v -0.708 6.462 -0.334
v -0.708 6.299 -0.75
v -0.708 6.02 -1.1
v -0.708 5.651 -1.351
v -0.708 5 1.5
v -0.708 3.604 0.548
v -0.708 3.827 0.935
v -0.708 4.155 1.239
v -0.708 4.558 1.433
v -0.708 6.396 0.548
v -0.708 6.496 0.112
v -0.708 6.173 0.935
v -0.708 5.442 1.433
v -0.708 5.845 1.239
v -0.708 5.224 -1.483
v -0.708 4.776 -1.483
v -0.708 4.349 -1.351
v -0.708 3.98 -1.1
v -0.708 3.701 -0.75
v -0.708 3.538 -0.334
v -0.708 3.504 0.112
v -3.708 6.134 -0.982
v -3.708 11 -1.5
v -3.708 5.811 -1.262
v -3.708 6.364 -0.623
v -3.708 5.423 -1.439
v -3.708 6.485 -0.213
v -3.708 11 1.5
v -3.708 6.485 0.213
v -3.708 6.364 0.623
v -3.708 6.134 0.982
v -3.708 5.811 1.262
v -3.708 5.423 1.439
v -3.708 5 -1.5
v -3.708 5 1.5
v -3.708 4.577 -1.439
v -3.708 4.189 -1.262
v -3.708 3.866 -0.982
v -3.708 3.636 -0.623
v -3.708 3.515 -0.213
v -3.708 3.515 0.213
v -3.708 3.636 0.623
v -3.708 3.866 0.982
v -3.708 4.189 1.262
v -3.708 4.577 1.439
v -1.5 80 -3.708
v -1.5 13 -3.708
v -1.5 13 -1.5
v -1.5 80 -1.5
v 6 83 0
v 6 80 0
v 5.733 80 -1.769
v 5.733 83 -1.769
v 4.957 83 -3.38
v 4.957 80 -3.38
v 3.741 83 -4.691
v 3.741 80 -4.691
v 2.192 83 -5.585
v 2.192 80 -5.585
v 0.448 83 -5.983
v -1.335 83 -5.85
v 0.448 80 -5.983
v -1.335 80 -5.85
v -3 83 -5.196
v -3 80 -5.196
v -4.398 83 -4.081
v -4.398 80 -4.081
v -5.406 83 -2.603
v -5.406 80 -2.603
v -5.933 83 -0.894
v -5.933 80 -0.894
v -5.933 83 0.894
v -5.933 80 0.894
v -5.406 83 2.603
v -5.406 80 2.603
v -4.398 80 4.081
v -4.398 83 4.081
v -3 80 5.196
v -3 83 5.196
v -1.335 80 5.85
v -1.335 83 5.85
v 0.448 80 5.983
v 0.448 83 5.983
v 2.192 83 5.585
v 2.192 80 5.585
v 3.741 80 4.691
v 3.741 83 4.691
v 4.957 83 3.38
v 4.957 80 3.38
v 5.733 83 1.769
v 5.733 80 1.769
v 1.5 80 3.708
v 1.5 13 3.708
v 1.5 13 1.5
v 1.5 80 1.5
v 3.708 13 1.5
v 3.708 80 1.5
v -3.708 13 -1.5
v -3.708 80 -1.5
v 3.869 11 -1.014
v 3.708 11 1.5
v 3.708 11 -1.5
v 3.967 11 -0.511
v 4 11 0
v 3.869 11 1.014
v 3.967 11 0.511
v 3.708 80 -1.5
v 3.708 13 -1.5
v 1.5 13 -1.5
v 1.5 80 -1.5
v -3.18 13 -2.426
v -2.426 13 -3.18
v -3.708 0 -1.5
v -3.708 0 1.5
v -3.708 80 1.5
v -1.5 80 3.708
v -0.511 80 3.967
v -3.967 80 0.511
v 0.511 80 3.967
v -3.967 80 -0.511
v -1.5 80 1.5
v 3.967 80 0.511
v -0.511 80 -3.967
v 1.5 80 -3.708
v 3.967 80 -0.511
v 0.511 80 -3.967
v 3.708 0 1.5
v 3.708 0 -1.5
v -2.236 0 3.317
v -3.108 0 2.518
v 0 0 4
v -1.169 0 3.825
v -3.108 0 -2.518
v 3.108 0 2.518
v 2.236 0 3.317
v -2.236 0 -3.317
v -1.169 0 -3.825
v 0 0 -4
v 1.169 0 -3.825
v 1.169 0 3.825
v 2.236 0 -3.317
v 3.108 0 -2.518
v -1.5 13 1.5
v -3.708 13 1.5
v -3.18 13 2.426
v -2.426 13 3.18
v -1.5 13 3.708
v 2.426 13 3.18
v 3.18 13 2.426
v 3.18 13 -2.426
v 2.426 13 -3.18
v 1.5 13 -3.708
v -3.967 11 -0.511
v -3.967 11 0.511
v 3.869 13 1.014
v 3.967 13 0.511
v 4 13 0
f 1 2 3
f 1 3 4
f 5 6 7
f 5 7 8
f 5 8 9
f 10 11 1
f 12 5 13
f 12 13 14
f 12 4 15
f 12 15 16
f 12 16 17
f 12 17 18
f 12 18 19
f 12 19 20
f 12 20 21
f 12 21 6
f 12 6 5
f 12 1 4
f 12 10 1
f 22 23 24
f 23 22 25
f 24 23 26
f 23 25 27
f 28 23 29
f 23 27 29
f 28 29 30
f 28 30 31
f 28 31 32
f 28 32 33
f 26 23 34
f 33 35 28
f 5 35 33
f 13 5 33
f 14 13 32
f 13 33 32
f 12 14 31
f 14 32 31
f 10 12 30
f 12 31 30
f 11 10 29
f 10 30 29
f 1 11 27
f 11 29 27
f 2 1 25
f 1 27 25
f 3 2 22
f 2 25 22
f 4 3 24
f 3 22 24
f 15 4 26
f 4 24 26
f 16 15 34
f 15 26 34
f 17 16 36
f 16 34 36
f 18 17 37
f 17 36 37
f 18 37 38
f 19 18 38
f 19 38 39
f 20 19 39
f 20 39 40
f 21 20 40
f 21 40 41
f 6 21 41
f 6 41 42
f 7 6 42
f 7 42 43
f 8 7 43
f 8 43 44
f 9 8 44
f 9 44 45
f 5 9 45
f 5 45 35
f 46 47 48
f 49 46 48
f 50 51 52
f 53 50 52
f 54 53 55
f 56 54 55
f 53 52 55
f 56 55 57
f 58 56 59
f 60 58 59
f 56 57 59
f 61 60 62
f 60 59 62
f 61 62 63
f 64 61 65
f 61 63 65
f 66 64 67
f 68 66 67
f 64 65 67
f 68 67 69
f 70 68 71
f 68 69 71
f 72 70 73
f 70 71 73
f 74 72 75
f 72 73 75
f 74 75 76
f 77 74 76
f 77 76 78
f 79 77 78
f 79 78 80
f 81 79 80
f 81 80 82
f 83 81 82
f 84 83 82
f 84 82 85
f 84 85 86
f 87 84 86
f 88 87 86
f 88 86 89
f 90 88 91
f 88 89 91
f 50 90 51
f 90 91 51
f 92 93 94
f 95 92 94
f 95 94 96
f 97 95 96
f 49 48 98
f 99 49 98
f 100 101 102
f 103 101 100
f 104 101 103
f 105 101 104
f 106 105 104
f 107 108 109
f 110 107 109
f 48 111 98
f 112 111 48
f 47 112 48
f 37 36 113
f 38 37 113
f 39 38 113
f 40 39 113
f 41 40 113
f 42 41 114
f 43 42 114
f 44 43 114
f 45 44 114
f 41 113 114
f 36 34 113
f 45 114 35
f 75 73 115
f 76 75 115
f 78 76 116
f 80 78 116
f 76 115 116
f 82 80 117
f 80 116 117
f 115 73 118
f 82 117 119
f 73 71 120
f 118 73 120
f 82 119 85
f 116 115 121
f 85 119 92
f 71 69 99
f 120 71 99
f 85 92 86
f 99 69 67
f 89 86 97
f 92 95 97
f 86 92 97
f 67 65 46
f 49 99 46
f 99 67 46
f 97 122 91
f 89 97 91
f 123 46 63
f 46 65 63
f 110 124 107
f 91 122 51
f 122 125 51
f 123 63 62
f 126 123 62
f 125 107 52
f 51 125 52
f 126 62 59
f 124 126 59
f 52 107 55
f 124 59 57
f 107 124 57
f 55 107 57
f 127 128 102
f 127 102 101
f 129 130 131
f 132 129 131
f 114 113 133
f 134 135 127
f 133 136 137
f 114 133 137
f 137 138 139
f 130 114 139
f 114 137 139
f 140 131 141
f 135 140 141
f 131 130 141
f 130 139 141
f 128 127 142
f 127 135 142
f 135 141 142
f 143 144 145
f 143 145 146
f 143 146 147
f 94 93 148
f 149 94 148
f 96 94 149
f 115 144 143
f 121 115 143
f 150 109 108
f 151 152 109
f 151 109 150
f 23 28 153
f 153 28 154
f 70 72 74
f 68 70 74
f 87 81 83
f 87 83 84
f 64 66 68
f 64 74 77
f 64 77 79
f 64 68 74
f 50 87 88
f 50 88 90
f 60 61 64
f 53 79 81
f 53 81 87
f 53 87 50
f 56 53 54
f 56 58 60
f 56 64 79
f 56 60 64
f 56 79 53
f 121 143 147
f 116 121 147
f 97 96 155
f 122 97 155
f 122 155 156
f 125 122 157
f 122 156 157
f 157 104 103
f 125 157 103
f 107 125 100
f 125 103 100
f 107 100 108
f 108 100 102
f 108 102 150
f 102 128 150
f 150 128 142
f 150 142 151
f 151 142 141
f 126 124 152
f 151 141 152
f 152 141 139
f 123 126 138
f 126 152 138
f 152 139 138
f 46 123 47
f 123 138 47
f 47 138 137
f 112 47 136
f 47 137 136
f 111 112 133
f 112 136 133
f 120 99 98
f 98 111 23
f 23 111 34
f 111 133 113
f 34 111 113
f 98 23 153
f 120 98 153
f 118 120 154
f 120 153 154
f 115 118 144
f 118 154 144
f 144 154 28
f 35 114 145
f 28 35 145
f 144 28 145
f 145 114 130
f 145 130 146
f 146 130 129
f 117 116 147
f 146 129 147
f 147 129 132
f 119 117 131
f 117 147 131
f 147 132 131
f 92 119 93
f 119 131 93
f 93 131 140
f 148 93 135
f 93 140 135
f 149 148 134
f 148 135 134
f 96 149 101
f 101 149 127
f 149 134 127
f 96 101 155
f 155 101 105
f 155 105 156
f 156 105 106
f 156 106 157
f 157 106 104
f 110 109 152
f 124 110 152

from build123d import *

# Parameters (mm, degrees)
SKETCH4_R               = 4
BOSS_EXTRUDE6_DEPTH     = 13
CUT_EXTRUDE3_DEPTH      = 1
CUT_EXTRUDE3_DEPTH_BACK = 11
SKETCH6_R               = 1.5
CUT_EXTRUDE4_DEPTH      = 3
BOSS_EXTRUDE7_DEPTH     = 67
SKETCH8_R               = 6
BOSS_EXTRUDE8_DEPTH     = 3


with BuildPart() as part:
    # Sketch4 → Boss-Extrude6 (new body)
    with BuildSketch(Plane(origin=(0, 0, 0), x_dir=(1, 0, 0), z_dir=(0, 1, 0))):
        Circle(SKETCH4_R)
    extrude(amount=BOSS_EXTRUDE6_DEPTH)

    # Sketch5 → Cut-Extrude3 (cut, two sides)
    with BuildSketch(Plane.XZ) as cut_extrude3_sk:
        with BuildLine():
            Line((-3.708099244, -1.5), (-3.708099244, 1.5))
            ThreePointArc((-3.708099244, 1.5), (-4, 0), (-3.708099244, -1.5))
        make_face()
        with BuildLine():
            Line((3.708099244, -1.5), (3.708099244, 1.5))
            ThreePointArc((3.708099244, 1.5), (4, 0), (3.708099244, -1.5))
        make_face()
    extrude(amount=CUT_EXTRUDE3_DEPTH, mode=Mode.SUBTRACT)
    extrude(cut_extrude3_sk.sketch, amount=-CUT_EXTRUDE3_DEPTH_BACK, mode=Mode.SUBTRACT)

    # Sketch6 → Cut-Extrude4 (cut)
    with BuildSketch(Plane.ZY.offset(3.708099244)):
        with Locations((0, 5)):
            Circle(SKETCH6_R)
    extrude(amount=-CUT_EXTRUDE4_DEPTH, mode=Mode.SUBTRACT)

    # Sketch7 → Boss-Extrude7 (add)
    with BuildSketch(Plane(origin=(0, 13, 0), x_dir=(1, 0, 0), z_dir=(0, 1, 0))):
        with BuildLine():
            Line((1.5, 1.5), (1.5, 3.708099244))
            ThreePointArc((1.5, 3.708099244), (0, 4), (-1.5, 3.708099244))
            Line((-1.5, 3.708099244), (-1.5, 1.5))
            Line((-1.5, 1.5), (-3.708099244, 1.5))
            ThreePointArc((-3.708099244, 1.5), (-4, 0), (-3.708099244, -1.5))
            Line((-3.708099244, -1.5), (-1.5, -1.5))
            Line((-1.5, -1.5), (-1.5, -3.708099244))
            ThreePointArc((-1.5, -3.708099244), (0, -4), (1.5, -3.708099244))
            Line((1.5, -3.708099244), (1.5, -1.5))
            Line((1.5, -1.5), (3.708099244, -1.5))
            ThreePointArc((3.708099244, -1.5), (4, 0), (3.708099244, 1.5))
            Line((3.708099244, 1.5), (1.5, 1.5))
        make_face()
    extrude(amount=BOSS_EXTRUDE7_DEPTH)

    # Sketch8 → Boss-Extrude8 (add)
    with BuildSketch(Plane(origin=(0, 80, 0), x_dir=(1, 0, 0), z_dir=(0, 1, 0))):
        Circle(SKETCH8_R)
    extrude(amount=BOSS_EXTRUDE8_DEPTH)


solid = part.part
